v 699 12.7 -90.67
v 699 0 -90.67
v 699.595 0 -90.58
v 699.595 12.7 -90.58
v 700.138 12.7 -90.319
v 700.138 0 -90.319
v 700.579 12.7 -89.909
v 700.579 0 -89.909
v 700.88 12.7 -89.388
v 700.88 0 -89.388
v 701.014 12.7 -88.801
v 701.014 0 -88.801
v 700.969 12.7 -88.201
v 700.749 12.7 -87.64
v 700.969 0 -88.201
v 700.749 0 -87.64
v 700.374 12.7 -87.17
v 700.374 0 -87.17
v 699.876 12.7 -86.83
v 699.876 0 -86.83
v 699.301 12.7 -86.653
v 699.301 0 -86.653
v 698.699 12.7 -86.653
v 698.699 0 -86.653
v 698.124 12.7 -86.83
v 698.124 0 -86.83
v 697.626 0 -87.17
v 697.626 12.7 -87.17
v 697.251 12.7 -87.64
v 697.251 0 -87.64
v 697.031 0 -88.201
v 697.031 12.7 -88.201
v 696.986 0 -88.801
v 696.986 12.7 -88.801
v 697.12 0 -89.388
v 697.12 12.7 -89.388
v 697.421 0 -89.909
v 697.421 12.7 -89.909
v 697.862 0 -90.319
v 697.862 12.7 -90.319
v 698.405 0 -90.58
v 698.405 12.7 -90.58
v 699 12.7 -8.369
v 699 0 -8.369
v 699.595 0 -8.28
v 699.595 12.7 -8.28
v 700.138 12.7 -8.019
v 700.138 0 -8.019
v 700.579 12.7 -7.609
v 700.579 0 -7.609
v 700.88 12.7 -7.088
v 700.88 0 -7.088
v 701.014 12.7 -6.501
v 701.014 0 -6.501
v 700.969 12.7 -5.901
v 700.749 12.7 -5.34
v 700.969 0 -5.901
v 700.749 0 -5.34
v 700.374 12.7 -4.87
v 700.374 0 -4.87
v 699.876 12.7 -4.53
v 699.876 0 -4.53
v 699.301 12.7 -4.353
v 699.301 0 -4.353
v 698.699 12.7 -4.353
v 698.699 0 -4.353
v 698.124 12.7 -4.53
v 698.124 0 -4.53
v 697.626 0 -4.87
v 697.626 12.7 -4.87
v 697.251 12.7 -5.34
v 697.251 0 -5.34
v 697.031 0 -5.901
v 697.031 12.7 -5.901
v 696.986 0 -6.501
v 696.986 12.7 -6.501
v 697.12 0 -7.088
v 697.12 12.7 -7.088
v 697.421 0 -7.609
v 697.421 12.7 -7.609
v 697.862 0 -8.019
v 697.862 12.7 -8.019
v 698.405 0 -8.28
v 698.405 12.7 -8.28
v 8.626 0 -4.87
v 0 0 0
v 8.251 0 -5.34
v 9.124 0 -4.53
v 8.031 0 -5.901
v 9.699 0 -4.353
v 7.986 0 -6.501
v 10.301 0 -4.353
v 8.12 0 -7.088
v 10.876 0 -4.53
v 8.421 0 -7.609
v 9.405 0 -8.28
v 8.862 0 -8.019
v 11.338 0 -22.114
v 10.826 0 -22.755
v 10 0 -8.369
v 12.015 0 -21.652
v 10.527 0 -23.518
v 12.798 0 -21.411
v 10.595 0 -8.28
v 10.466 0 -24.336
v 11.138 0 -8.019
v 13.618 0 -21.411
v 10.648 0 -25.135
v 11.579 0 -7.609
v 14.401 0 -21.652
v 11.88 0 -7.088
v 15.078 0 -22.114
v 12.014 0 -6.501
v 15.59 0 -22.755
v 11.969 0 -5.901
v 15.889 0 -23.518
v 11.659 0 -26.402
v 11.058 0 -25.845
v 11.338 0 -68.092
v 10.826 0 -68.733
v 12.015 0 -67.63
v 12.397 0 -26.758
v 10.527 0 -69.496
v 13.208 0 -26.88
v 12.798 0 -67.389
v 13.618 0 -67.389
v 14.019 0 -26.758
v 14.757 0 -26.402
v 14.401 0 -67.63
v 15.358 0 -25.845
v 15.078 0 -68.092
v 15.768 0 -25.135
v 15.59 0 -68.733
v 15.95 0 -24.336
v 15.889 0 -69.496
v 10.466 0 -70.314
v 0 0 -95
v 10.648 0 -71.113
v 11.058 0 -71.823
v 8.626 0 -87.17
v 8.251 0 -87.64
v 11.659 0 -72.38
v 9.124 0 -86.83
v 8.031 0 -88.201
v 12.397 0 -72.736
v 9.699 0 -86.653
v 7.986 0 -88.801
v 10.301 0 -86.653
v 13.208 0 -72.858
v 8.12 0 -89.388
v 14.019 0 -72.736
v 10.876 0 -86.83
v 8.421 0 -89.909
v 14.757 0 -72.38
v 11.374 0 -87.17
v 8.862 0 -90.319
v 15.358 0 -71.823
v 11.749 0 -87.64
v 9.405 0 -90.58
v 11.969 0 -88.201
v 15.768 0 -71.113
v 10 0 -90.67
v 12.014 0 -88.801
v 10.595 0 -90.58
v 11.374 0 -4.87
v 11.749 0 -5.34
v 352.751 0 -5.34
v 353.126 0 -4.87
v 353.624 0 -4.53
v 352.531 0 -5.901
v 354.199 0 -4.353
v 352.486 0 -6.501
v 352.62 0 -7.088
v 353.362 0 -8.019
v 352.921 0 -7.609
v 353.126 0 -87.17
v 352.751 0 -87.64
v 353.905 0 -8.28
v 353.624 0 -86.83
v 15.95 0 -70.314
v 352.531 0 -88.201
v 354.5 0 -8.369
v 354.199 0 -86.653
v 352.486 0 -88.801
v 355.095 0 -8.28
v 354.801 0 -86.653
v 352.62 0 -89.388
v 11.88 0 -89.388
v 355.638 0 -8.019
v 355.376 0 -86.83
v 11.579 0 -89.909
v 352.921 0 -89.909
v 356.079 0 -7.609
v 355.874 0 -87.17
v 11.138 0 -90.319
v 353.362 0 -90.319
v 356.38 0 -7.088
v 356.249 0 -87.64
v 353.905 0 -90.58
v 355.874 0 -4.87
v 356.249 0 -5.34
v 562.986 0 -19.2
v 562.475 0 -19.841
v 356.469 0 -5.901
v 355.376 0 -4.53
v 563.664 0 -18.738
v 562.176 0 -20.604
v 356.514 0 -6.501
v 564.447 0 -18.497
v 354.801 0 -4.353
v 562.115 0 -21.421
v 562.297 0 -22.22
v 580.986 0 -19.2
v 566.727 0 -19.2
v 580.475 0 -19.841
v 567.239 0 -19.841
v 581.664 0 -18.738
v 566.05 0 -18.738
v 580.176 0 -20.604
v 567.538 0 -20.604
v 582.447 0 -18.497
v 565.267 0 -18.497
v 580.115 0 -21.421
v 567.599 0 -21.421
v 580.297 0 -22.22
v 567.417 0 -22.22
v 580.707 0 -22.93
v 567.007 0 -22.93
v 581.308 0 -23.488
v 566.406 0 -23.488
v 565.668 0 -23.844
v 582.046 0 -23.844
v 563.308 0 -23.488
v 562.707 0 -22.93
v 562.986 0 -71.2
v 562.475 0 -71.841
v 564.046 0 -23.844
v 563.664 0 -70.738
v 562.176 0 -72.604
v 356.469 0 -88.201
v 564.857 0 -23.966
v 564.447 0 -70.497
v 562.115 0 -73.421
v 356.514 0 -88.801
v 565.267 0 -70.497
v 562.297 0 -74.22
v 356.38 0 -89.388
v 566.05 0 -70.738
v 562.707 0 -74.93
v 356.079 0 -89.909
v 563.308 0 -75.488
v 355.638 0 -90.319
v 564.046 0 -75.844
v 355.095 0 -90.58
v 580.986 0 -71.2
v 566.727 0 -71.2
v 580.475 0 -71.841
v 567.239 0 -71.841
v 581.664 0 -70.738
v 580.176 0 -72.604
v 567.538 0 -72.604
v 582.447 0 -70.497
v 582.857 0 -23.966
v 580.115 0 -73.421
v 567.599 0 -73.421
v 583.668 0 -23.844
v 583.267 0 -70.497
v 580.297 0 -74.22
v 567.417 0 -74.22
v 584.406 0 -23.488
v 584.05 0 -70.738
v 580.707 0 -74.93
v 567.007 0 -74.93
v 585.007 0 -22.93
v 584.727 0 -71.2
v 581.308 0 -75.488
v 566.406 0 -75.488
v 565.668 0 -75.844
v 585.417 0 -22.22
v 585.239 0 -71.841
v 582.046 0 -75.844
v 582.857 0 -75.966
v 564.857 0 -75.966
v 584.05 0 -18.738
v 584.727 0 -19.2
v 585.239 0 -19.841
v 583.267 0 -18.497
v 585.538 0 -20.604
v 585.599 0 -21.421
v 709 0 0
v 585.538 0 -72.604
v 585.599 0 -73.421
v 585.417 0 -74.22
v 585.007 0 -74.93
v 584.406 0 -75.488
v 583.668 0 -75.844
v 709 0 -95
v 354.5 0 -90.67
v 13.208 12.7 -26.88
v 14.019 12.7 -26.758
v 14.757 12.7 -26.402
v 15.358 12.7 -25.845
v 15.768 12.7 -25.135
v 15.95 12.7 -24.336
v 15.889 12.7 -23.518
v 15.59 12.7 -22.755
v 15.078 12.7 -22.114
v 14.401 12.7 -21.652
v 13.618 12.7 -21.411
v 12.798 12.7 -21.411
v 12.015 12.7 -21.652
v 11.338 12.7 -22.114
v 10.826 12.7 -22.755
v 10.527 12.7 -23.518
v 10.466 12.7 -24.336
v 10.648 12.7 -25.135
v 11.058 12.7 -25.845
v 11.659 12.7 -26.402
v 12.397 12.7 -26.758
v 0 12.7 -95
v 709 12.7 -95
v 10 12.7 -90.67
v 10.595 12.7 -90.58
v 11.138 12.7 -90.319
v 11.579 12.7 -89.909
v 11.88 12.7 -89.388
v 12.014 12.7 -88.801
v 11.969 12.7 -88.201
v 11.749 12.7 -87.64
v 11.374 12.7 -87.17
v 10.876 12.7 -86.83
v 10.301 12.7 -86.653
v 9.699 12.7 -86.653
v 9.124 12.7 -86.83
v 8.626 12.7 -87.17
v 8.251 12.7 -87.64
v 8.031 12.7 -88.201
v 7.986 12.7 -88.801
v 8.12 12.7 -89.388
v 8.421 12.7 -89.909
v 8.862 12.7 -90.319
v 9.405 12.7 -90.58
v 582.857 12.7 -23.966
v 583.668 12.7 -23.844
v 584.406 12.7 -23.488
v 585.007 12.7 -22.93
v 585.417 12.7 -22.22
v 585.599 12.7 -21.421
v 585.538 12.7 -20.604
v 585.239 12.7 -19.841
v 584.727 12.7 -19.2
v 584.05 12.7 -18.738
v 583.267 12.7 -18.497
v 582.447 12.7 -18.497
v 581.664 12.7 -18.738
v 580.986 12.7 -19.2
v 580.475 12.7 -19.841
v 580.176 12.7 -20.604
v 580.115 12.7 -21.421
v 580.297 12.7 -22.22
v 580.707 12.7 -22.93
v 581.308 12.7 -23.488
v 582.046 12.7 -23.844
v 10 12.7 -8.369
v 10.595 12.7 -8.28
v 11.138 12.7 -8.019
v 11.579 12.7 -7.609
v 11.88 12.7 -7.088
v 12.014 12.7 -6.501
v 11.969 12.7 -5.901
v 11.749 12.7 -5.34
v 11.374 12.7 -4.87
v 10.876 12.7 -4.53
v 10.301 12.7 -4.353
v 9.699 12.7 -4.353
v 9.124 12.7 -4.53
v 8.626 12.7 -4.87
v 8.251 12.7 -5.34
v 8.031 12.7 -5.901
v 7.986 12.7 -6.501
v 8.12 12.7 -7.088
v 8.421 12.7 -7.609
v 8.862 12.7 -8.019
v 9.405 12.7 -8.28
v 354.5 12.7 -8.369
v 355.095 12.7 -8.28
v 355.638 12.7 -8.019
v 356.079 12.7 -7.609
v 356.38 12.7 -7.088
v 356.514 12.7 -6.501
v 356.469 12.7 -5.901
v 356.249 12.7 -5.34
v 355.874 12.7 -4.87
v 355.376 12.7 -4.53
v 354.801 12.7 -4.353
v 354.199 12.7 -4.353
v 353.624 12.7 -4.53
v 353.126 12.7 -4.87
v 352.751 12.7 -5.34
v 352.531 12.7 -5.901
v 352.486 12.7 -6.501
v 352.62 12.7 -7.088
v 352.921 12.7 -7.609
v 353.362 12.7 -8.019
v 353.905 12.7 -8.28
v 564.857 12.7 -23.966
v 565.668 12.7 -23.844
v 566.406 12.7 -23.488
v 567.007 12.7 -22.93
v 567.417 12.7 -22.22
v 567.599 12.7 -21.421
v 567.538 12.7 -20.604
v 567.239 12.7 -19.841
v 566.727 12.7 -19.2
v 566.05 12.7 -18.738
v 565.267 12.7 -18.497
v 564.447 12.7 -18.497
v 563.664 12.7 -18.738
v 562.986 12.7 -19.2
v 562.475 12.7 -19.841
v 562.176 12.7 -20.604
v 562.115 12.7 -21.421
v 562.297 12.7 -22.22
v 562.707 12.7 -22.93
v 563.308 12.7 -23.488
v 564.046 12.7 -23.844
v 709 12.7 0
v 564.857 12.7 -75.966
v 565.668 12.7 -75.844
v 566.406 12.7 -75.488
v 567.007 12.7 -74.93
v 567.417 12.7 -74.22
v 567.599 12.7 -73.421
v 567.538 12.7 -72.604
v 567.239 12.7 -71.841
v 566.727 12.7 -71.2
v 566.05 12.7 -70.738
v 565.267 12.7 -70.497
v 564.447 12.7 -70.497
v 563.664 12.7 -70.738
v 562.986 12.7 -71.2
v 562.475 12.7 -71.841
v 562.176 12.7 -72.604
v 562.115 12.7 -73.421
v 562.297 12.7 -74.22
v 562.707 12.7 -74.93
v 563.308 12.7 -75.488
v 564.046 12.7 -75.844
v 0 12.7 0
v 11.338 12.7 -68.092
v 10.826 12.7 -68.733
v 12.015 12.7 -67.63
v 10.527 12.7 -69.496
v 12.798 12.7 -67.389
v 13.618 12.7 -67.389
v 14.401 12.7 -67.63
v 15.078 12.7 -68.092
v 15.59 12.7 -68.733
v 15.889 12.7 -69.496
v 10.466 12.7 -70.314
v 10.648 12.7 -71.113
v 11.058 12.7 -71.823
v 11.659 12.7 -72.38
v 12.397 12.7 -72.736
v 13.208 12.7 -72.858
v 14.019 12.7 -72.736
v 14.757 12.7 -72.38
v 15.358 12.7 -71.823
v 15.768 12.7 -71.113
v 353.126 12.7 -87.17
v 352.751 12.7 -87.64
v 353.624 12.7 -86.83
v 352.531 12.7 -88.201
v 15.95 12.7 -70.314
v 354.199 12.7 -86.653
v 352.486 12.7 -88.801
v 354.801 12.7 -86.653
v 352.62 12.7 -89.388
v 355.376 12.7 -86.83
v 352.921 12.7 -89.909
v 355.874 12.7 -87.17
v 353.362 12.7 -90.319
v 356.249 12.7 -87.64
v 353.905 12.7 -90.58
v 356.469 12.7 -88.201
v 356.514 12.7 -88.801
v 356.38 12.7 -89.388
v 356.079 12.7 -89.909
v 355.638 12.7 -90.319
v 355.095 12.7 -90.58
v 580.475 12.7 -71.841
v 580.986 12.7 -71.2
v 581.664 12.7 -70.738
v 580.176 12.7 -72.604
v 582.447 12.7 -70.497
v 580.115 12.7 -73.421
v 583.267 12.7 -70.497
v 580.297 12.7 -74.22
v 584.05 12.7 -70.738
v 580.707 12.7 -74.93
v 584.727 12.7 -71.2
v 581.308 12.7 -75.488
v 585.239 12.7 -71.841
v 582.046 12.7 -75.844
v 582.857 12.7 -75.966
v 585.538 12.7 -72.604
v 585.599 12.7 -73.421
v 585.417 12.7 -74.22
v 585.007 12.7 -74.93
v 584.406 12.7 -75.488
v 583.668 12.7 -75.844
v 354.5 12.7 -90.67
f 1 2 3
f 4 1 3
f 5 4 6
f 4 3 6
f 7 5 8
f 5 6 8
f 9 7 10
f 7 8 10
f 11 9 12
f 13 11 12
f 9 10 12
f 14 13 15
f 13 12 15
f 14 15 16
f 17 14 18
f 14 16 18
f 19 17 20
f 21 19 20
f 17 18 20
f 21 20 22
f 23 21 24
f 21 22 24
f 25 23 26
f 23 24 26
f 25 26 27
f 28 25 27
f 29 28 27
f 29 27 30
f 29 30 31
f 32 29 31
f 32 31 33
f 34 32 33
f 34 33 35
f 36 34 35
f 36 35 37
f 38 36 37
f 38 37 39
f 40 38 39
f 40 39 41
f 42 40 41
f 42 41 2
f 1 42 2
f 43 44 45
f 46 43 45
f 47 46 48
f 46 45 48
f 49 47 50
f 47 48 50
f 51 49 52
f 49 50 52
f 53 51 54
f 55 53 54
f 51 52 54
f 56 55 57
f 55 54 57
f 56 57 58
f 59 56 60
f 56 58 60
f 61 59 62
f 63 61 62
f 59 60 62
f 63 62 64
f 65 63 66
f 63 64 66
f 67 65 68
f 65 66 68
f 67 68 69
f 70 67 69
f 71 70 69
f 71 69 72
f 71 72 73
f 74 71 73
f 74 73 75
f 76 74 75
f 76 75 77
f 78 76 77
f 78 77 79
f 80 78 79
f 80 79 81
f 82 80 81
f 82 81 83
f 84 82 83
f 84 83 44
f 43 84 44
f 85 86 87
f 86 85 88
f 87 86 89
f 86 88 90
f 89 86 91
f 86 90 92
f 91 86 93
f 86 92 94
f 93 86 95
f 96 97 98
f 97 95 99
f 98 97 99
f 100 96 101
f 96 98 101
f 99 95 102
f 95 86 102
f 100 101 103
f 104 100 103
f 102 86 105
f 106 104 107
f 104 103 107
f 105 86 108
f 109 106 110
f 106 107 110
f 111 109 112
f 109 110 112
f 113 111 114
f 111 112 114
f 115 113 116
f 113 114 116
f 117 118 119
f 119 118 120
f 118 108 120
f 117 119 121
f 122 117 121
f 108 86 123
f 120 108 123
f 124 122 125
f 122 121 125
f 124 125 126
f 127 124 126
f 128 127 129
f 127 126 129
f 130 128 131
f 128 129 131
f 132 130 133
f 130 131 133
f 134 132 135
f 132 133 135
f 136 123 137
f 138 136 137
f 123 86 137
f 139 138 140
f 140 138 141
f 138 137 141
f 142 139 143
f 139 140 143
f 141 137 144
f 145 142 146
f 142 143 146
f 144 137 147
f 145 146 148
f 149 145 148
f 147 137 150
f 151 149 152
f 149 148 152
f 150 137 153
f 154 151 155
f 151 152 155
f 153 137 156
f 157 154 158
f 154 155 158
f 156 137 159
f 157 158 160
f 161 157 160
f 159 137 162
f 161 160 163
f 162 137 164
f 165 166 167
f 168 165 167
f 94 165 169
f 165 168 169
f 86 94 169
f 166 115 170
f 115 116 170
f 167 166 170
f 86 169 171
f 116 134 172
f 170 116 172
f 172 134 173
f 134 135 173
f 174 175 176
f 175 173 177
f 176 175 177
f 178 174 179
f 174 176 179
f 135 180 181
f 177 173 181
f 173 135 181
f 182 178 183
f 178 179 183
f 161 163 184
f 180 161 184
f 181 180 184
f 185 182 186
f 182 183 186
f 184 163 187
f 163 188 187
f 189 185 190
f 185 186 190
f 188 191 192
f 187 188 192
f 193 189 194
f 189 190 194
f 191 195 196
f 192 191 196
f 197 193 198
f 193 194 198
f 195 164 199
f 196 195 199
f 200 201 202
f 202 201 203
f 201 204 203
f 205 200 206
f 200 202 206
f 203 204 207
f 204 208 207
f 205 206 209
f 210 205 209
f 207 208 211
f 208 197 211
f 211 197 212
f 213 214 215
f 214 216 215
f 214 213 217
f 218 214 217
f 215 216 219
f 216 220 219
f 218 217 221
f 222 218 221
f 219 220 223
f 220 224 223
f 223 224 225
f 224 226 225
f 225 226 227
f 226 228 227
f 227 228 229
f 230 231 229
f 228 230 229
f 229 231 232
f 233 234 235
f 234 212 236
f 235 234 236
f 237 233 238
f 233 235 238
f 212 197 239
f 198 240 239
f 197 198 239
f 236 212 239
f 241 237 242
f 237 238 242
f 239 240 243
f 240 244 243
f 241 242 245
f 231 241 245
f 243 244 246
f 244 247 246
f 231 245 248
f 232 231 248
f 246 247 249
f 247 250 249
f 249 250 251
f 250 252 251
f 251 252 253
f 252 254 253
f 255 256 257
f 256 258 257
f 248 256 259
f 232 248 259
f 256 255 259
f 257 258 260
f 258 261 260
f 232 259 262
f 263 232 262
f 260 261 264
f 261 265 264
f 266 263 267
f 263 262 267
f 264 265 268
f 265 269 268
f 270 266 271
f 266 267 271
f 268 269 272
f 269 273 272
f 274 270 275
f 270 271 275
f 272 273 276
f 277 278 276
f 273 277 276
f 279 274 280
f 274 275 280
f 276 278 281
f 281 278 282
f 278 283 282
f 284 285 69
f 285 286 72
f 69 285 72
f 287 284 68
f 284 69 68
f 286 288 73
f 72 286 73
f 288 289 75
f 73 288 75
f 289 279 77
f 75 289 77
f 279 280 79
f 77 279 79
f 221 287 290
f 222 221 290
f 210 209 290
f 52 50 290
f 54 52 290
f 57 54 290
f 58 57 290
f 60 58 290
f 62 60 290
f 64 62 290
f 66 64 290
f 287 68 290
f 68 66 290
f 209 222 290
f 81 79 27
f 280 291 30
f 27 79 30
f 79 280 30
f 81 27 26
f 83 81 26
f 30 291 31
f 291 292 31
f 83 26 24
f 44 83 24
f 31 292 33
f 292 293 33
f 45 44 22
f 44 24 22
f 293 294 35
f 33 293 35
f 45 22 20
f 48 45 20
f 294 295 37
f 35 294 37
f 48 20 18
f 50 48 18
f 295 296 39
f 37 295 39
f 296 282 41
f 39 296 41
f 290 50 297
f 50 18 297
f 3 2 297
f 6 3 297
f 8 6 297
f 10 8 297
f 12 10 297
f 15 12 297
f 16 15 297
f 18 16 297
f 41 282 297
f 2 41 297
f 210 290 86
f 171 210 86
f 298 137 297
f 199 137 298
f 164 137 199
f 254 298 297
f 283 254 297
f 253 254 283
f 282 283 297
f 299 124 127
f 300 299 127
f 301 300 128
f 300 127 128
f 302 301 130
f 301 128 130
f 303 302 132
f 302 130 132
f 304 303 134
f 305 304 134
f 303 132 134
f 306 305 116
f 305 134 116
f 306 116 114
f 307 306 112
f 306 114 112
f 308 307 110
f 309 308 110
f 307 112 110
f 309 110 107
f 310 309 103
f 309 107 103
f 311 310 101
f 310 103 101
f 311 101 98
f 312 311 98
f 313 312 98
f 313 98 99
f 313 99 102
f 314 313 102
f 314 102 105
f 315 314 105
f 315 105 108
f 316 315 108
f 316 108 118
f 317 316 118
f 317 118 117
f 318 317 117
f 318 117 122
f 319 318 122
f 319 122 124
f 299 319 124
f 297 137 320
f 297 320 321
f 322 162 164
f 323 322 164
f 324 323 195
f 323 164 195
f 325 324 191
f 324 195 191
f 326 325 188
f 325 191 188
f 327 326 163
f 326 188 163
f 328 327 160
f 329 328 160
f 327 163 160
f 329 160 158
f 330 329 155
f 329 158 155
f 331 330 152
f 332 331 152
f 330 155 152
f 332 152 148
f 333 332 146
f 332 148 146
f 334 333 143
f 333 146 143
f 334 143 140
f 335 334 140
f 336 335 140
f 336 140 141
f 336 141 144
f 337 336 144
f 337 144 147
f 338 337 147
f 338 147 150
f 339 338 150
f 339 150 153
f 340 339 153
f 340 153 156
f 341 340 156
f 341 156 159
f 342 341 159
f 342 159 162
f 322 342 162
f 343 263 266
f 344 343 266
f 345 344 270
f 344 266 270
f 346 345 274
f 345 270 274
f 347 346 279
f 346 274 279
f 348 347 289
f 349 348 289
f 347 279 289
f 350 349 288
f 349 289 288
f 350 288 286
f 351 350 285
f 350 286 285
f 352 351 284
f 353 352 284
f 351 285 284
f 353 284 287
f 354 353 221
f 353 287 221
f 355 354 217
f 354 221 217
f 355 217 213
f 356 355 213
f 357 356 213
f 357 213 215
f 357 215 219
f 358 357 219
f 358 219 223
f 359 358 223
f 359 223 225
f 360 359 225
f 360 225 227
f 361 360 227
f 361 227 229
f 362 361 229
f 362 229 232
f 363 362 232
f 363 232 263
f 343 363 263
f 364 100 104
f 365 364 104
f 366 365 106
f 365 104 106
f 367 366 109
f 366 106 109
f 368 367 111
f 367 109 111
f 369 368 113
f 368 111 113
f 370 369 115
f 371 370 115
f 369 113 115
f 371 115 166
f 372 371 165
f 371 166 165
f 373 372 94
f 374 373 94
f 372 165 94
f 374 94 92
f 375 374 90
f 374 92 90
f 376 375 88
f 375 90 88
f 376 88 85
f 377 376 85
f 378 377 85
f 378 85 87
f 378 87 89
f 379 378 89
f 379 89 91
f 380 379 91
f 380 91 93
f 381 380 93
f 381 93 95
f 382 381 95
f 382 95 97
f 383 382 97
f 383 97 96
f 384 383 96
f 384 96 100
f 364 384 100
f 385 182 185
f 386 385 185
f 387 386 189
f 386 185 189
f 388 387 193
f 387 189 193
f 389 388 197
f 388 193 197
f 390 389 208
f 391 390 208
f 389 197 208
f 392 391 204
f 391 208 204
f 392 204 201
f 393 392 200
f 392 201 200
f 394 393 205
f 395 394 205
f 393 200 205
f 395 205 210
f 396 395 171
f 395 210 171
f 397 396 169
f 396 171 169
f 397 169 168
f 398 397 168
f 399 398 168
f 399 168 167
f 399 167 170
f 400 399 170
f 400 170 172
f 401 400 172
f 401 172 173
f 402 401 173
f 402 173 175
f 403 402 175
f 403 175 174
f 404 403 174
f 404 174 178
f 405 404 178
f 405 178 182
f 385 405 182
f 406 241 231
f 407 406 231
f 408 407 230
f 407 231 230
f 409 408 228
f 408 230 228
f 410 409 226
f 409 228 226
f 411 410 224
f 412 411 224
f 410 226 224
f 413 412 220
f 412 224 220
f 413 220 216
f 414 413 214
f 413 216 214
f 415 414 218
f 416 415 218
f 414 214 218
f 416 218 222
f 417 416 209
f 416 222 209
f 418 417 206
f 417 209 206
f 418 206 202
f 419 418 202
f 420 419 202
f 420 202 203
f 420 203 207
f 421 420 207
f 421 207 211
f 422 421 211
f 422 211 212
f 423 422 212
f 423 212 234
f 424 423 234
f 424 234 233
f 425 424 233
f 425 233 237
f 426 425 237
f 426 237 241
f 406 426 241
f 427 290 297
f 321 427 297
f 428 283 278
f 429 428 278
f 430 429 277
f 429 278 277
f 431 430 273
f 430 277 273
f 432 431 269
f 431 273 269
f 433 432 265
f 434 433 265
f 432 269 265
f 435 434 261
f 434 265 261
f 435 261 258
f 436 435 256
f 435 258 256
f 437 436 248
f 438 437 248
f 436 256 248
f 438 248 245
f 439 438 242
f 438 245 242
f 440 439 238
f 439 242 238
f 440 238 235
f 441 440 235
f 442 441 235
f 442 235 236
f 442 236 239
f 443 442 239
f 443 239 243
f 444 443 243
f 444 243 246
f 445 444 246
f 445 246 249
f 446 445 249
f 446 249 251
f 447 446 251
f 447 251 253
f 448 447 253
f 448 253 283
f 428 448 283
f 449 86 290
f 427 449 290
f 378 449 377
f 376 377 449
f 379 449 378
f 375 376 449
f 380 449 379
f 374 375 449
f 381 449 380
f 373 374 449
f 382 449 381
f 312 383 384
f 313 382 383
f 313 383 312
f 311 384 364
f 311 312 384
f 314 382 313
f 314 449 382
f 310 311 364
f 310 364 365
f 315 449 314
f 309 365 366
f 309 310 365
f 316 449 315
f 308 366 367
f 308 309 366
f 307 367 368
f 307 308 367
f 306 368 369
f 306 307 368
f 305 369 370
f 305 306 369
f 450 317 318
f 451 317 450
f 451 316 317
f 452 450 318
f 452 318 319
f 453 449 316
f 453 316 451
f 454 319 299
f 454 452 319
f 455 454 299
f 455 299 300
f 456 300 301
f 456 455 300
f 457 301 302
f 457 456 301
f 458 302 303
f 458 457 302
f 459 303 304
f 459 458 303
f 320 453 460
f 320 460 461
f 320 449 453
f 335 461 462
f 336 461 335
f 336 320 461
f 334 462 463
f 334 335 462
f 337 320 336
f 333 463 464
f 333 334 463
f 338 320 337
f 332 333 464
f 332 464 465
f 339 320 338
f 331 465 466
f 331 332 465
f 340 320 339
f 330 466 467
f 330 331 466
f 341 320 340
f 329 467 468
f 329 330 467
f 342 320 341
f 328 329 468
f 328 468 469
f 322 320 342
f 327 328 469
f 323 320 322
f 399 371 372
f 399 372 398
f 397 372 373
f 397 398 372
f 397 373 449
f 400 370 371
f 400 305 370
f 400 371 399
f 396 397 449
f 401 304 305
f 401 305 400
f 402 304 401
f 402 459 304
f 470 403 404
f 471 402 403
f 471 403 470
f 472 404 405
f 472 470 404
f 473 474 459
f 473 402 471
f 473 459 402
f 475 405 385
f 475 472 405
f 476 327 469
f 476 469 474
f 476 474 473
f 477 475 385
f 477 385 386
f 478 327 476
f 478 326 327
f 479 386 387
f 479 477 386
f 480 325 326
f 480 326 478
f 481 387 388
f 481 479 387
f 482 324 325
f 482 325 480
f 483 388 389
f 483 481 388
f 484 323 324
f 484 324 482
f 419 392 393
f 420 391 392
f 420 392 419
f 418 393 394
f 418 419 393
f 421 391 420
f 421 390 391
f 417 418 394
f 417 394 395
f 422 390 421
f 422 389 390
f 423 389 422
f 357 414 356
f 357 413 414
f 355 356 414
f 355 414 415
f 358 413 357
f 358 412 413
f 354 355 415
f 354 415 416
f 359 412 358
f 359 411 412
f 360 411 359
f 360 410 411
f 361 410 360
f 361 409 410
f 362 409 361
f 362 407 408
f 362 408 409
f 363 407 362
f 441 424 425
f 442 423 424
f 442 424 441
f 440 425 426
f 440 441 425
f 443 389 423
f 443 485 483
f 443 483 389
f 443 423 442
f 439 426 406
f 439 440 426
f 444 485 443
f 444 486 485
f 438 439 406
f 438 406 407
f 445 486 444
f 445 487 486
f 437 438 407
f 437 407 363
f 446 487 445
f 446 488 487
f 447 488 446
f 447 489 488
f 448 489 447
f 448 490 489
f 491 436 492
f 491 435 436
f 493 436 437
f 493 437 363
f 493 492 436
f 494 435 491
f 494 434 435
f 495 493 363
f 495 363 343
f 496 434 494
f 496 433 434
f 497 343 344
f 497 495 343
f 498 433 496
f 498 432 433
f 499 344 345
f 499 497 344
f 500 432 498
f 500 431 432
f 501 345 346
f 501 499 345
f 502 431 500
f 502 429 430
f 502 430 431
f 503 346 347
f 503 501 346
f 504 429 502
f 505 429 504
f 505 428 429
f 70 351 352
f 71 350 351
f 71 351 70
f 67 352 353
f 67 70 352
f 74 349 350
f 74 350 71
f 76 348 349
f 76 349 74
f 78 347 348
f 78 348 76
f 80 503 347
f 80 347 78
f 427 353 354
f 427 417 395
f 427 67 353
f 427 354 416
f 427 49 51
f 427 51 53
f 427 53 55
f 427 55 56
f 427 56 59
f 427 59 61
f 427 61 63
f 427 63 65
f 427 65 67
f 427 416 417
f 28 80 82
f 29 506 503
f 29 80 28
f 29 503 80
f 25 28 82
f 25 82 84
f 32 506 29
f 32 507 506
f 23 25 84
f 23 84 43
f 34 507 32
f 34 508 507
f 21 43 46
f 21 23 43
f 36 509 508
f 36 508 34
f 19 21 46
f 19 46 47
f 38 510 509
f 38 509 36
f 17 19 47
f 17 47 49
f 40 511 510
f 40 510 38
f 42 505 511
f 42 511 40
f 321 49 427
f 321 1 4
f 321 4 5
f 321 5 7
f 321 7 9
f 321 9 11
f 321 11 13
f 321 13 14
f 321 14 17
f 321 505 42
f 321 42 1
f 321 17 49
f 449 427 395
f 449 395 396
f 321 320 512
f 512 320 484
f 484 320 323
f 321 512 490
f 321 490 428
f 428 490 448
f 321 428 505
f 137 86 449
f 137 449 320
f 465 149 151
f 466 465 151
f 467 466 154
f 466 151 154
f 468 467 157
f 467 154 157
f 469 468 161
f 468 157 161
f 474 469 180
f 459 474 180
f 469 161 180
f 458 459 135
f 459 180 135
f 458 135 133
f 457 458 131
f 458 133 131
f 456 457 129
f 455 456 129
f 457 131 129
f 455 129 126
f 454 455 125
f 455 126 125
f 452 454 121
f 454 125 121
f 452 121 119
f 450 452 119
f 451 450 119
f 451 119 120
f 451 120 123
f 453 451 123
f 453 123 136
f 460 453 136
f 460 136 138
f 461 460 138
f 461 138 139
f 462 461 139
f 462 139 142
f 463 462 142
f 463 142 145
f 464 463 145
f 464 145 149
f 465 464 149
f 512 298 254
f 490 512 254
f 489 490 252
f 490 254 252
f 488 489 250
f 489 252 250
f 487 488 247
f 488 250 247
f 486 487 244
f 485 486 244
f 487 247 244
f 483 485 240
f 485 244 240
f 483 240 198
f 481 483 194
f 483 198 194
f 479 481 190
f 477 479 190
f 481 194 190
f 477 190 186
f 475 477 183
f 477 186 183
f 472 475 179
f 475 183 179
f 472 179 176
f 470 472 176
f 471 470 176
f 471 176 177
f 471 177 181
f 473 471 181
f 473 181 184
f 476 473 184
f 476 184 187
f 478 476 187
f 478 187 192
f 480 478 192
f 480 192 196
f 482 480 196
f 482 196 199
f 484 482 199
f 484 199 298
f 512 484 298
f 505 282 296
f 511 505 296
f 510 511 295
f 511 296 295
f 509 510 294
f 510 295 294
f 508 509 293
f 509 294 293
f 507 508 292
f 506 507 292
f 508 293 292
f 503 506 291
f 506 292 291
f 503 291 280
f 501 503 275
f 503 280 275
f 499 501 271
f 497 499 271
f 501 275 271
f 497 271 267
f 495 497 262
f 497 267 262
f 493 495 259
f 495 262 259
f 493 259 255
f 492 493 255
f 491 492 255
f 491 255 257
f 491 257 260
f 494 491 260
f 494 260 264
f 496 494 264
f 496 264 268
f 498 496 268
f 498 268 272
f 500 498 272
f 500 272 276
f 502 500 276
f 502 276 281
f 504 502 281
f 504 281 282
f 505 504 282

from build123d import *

# Parameters (mm, degrees)
SKETCH1_W           = 709
SKETCH1_H           = 95
BOSS_EXTRUDE1_DEPTH = 12.7
SKETCH2_R           = 2.0195
CUT_EXTRUDE1_DEPTH  = 716.449012858
SKETCH3_R           = 2.75
CUT_EXTRUDE2_DEPTH  = 716.449012858
SKETCH4_R           = 2.75
CUT_EXTRUDE3_DEPTH  = 716.449012858


with BuildPart() as part:
    # Sketch1 → Boss-Extrude1 (new body)
    with BuildSketch(Plane(origin=(0, 0, 0), x_dir=(1, 0, 0), z_dir=(0, 1, 0))):
        with Locations((354.5, 47.5)):
            Rectangle(SKETCH1_W, SKETCH1_H)
    extrude(amount=BOSS_EXTRUDE1_DEPTH)

    # Sketch2 → Cut-Extrude1 (cut, through all)
    with BuildSketch(Plane.XZ):
        with Locations(Location((10, -88.65, 0), (0, 0, 270))):
            Circle(SKETCH2_R)
        with Locations(Location((354.5, -88.65, 0), (0, 0, 270))):
            Circle(SKETCH2_R)
        with Locations(Location((699, -88.65, 0), (0, 0, 270))):
            Circle(SKETCH2_R)
        with Locations(Location((699, -6.35, 0), (0, 0, 270))):
            Circle(SKETCH2_R)
        with Locations(Location((354.5, -6.35, 0), (0, 0, 270))):
            Circle(SKETCH2_R)
        with Locations(Location((10, -6.35, 0), (0, 0, 270))):
            Circle(SKETCH2_R)
    extrude(amount=-CUT_EXTRUDE1_DEPTH, mode=Mode.SUBTRACT)

    # Sketch3 → Cut-Extrude2 (cut, through all)
    with BuildSketch(Plane.XZ):
        with Locations(Location((582.856967806, -21.2158, 0), (0, 0, 270))):
            Circle(SKETCH3_R)
        with Locations(Location((564.856967806, -21.2158, 0), (0, 0, 270))):
            Circle(SKETCH3_R)
        with Locations(Location((564.856967806, -73.2158, 0), (0, 0, 270))):
            Circle(SKETCH3_R)
        with Locations(Location((582.856967806, -73.2158, 0), (0, 0, 270))):
            Circle(SKETCH3_R)
    extrude(amount=-CUT_EXTRUDE2_DEPTH, mode=Mode.SUBTRACT)

    # Sketch4 → Cut-Extrude3 (cut, through all)
    with BuildSketch(Plane.XZ):
        with Locations(Location((13.208, -24.13, 0), (0, 0, 270))):
            Circle(SKETCH4_R)
        with Locations(Location((13.208, -70.108, 0), (0, 0, 270))):
            Circle(SKETCH4_R)
    extrude(amount=-CUT_EXTRUDE3_DEPTH, mode=Mode.SUBTRACT)


solid = part.part
